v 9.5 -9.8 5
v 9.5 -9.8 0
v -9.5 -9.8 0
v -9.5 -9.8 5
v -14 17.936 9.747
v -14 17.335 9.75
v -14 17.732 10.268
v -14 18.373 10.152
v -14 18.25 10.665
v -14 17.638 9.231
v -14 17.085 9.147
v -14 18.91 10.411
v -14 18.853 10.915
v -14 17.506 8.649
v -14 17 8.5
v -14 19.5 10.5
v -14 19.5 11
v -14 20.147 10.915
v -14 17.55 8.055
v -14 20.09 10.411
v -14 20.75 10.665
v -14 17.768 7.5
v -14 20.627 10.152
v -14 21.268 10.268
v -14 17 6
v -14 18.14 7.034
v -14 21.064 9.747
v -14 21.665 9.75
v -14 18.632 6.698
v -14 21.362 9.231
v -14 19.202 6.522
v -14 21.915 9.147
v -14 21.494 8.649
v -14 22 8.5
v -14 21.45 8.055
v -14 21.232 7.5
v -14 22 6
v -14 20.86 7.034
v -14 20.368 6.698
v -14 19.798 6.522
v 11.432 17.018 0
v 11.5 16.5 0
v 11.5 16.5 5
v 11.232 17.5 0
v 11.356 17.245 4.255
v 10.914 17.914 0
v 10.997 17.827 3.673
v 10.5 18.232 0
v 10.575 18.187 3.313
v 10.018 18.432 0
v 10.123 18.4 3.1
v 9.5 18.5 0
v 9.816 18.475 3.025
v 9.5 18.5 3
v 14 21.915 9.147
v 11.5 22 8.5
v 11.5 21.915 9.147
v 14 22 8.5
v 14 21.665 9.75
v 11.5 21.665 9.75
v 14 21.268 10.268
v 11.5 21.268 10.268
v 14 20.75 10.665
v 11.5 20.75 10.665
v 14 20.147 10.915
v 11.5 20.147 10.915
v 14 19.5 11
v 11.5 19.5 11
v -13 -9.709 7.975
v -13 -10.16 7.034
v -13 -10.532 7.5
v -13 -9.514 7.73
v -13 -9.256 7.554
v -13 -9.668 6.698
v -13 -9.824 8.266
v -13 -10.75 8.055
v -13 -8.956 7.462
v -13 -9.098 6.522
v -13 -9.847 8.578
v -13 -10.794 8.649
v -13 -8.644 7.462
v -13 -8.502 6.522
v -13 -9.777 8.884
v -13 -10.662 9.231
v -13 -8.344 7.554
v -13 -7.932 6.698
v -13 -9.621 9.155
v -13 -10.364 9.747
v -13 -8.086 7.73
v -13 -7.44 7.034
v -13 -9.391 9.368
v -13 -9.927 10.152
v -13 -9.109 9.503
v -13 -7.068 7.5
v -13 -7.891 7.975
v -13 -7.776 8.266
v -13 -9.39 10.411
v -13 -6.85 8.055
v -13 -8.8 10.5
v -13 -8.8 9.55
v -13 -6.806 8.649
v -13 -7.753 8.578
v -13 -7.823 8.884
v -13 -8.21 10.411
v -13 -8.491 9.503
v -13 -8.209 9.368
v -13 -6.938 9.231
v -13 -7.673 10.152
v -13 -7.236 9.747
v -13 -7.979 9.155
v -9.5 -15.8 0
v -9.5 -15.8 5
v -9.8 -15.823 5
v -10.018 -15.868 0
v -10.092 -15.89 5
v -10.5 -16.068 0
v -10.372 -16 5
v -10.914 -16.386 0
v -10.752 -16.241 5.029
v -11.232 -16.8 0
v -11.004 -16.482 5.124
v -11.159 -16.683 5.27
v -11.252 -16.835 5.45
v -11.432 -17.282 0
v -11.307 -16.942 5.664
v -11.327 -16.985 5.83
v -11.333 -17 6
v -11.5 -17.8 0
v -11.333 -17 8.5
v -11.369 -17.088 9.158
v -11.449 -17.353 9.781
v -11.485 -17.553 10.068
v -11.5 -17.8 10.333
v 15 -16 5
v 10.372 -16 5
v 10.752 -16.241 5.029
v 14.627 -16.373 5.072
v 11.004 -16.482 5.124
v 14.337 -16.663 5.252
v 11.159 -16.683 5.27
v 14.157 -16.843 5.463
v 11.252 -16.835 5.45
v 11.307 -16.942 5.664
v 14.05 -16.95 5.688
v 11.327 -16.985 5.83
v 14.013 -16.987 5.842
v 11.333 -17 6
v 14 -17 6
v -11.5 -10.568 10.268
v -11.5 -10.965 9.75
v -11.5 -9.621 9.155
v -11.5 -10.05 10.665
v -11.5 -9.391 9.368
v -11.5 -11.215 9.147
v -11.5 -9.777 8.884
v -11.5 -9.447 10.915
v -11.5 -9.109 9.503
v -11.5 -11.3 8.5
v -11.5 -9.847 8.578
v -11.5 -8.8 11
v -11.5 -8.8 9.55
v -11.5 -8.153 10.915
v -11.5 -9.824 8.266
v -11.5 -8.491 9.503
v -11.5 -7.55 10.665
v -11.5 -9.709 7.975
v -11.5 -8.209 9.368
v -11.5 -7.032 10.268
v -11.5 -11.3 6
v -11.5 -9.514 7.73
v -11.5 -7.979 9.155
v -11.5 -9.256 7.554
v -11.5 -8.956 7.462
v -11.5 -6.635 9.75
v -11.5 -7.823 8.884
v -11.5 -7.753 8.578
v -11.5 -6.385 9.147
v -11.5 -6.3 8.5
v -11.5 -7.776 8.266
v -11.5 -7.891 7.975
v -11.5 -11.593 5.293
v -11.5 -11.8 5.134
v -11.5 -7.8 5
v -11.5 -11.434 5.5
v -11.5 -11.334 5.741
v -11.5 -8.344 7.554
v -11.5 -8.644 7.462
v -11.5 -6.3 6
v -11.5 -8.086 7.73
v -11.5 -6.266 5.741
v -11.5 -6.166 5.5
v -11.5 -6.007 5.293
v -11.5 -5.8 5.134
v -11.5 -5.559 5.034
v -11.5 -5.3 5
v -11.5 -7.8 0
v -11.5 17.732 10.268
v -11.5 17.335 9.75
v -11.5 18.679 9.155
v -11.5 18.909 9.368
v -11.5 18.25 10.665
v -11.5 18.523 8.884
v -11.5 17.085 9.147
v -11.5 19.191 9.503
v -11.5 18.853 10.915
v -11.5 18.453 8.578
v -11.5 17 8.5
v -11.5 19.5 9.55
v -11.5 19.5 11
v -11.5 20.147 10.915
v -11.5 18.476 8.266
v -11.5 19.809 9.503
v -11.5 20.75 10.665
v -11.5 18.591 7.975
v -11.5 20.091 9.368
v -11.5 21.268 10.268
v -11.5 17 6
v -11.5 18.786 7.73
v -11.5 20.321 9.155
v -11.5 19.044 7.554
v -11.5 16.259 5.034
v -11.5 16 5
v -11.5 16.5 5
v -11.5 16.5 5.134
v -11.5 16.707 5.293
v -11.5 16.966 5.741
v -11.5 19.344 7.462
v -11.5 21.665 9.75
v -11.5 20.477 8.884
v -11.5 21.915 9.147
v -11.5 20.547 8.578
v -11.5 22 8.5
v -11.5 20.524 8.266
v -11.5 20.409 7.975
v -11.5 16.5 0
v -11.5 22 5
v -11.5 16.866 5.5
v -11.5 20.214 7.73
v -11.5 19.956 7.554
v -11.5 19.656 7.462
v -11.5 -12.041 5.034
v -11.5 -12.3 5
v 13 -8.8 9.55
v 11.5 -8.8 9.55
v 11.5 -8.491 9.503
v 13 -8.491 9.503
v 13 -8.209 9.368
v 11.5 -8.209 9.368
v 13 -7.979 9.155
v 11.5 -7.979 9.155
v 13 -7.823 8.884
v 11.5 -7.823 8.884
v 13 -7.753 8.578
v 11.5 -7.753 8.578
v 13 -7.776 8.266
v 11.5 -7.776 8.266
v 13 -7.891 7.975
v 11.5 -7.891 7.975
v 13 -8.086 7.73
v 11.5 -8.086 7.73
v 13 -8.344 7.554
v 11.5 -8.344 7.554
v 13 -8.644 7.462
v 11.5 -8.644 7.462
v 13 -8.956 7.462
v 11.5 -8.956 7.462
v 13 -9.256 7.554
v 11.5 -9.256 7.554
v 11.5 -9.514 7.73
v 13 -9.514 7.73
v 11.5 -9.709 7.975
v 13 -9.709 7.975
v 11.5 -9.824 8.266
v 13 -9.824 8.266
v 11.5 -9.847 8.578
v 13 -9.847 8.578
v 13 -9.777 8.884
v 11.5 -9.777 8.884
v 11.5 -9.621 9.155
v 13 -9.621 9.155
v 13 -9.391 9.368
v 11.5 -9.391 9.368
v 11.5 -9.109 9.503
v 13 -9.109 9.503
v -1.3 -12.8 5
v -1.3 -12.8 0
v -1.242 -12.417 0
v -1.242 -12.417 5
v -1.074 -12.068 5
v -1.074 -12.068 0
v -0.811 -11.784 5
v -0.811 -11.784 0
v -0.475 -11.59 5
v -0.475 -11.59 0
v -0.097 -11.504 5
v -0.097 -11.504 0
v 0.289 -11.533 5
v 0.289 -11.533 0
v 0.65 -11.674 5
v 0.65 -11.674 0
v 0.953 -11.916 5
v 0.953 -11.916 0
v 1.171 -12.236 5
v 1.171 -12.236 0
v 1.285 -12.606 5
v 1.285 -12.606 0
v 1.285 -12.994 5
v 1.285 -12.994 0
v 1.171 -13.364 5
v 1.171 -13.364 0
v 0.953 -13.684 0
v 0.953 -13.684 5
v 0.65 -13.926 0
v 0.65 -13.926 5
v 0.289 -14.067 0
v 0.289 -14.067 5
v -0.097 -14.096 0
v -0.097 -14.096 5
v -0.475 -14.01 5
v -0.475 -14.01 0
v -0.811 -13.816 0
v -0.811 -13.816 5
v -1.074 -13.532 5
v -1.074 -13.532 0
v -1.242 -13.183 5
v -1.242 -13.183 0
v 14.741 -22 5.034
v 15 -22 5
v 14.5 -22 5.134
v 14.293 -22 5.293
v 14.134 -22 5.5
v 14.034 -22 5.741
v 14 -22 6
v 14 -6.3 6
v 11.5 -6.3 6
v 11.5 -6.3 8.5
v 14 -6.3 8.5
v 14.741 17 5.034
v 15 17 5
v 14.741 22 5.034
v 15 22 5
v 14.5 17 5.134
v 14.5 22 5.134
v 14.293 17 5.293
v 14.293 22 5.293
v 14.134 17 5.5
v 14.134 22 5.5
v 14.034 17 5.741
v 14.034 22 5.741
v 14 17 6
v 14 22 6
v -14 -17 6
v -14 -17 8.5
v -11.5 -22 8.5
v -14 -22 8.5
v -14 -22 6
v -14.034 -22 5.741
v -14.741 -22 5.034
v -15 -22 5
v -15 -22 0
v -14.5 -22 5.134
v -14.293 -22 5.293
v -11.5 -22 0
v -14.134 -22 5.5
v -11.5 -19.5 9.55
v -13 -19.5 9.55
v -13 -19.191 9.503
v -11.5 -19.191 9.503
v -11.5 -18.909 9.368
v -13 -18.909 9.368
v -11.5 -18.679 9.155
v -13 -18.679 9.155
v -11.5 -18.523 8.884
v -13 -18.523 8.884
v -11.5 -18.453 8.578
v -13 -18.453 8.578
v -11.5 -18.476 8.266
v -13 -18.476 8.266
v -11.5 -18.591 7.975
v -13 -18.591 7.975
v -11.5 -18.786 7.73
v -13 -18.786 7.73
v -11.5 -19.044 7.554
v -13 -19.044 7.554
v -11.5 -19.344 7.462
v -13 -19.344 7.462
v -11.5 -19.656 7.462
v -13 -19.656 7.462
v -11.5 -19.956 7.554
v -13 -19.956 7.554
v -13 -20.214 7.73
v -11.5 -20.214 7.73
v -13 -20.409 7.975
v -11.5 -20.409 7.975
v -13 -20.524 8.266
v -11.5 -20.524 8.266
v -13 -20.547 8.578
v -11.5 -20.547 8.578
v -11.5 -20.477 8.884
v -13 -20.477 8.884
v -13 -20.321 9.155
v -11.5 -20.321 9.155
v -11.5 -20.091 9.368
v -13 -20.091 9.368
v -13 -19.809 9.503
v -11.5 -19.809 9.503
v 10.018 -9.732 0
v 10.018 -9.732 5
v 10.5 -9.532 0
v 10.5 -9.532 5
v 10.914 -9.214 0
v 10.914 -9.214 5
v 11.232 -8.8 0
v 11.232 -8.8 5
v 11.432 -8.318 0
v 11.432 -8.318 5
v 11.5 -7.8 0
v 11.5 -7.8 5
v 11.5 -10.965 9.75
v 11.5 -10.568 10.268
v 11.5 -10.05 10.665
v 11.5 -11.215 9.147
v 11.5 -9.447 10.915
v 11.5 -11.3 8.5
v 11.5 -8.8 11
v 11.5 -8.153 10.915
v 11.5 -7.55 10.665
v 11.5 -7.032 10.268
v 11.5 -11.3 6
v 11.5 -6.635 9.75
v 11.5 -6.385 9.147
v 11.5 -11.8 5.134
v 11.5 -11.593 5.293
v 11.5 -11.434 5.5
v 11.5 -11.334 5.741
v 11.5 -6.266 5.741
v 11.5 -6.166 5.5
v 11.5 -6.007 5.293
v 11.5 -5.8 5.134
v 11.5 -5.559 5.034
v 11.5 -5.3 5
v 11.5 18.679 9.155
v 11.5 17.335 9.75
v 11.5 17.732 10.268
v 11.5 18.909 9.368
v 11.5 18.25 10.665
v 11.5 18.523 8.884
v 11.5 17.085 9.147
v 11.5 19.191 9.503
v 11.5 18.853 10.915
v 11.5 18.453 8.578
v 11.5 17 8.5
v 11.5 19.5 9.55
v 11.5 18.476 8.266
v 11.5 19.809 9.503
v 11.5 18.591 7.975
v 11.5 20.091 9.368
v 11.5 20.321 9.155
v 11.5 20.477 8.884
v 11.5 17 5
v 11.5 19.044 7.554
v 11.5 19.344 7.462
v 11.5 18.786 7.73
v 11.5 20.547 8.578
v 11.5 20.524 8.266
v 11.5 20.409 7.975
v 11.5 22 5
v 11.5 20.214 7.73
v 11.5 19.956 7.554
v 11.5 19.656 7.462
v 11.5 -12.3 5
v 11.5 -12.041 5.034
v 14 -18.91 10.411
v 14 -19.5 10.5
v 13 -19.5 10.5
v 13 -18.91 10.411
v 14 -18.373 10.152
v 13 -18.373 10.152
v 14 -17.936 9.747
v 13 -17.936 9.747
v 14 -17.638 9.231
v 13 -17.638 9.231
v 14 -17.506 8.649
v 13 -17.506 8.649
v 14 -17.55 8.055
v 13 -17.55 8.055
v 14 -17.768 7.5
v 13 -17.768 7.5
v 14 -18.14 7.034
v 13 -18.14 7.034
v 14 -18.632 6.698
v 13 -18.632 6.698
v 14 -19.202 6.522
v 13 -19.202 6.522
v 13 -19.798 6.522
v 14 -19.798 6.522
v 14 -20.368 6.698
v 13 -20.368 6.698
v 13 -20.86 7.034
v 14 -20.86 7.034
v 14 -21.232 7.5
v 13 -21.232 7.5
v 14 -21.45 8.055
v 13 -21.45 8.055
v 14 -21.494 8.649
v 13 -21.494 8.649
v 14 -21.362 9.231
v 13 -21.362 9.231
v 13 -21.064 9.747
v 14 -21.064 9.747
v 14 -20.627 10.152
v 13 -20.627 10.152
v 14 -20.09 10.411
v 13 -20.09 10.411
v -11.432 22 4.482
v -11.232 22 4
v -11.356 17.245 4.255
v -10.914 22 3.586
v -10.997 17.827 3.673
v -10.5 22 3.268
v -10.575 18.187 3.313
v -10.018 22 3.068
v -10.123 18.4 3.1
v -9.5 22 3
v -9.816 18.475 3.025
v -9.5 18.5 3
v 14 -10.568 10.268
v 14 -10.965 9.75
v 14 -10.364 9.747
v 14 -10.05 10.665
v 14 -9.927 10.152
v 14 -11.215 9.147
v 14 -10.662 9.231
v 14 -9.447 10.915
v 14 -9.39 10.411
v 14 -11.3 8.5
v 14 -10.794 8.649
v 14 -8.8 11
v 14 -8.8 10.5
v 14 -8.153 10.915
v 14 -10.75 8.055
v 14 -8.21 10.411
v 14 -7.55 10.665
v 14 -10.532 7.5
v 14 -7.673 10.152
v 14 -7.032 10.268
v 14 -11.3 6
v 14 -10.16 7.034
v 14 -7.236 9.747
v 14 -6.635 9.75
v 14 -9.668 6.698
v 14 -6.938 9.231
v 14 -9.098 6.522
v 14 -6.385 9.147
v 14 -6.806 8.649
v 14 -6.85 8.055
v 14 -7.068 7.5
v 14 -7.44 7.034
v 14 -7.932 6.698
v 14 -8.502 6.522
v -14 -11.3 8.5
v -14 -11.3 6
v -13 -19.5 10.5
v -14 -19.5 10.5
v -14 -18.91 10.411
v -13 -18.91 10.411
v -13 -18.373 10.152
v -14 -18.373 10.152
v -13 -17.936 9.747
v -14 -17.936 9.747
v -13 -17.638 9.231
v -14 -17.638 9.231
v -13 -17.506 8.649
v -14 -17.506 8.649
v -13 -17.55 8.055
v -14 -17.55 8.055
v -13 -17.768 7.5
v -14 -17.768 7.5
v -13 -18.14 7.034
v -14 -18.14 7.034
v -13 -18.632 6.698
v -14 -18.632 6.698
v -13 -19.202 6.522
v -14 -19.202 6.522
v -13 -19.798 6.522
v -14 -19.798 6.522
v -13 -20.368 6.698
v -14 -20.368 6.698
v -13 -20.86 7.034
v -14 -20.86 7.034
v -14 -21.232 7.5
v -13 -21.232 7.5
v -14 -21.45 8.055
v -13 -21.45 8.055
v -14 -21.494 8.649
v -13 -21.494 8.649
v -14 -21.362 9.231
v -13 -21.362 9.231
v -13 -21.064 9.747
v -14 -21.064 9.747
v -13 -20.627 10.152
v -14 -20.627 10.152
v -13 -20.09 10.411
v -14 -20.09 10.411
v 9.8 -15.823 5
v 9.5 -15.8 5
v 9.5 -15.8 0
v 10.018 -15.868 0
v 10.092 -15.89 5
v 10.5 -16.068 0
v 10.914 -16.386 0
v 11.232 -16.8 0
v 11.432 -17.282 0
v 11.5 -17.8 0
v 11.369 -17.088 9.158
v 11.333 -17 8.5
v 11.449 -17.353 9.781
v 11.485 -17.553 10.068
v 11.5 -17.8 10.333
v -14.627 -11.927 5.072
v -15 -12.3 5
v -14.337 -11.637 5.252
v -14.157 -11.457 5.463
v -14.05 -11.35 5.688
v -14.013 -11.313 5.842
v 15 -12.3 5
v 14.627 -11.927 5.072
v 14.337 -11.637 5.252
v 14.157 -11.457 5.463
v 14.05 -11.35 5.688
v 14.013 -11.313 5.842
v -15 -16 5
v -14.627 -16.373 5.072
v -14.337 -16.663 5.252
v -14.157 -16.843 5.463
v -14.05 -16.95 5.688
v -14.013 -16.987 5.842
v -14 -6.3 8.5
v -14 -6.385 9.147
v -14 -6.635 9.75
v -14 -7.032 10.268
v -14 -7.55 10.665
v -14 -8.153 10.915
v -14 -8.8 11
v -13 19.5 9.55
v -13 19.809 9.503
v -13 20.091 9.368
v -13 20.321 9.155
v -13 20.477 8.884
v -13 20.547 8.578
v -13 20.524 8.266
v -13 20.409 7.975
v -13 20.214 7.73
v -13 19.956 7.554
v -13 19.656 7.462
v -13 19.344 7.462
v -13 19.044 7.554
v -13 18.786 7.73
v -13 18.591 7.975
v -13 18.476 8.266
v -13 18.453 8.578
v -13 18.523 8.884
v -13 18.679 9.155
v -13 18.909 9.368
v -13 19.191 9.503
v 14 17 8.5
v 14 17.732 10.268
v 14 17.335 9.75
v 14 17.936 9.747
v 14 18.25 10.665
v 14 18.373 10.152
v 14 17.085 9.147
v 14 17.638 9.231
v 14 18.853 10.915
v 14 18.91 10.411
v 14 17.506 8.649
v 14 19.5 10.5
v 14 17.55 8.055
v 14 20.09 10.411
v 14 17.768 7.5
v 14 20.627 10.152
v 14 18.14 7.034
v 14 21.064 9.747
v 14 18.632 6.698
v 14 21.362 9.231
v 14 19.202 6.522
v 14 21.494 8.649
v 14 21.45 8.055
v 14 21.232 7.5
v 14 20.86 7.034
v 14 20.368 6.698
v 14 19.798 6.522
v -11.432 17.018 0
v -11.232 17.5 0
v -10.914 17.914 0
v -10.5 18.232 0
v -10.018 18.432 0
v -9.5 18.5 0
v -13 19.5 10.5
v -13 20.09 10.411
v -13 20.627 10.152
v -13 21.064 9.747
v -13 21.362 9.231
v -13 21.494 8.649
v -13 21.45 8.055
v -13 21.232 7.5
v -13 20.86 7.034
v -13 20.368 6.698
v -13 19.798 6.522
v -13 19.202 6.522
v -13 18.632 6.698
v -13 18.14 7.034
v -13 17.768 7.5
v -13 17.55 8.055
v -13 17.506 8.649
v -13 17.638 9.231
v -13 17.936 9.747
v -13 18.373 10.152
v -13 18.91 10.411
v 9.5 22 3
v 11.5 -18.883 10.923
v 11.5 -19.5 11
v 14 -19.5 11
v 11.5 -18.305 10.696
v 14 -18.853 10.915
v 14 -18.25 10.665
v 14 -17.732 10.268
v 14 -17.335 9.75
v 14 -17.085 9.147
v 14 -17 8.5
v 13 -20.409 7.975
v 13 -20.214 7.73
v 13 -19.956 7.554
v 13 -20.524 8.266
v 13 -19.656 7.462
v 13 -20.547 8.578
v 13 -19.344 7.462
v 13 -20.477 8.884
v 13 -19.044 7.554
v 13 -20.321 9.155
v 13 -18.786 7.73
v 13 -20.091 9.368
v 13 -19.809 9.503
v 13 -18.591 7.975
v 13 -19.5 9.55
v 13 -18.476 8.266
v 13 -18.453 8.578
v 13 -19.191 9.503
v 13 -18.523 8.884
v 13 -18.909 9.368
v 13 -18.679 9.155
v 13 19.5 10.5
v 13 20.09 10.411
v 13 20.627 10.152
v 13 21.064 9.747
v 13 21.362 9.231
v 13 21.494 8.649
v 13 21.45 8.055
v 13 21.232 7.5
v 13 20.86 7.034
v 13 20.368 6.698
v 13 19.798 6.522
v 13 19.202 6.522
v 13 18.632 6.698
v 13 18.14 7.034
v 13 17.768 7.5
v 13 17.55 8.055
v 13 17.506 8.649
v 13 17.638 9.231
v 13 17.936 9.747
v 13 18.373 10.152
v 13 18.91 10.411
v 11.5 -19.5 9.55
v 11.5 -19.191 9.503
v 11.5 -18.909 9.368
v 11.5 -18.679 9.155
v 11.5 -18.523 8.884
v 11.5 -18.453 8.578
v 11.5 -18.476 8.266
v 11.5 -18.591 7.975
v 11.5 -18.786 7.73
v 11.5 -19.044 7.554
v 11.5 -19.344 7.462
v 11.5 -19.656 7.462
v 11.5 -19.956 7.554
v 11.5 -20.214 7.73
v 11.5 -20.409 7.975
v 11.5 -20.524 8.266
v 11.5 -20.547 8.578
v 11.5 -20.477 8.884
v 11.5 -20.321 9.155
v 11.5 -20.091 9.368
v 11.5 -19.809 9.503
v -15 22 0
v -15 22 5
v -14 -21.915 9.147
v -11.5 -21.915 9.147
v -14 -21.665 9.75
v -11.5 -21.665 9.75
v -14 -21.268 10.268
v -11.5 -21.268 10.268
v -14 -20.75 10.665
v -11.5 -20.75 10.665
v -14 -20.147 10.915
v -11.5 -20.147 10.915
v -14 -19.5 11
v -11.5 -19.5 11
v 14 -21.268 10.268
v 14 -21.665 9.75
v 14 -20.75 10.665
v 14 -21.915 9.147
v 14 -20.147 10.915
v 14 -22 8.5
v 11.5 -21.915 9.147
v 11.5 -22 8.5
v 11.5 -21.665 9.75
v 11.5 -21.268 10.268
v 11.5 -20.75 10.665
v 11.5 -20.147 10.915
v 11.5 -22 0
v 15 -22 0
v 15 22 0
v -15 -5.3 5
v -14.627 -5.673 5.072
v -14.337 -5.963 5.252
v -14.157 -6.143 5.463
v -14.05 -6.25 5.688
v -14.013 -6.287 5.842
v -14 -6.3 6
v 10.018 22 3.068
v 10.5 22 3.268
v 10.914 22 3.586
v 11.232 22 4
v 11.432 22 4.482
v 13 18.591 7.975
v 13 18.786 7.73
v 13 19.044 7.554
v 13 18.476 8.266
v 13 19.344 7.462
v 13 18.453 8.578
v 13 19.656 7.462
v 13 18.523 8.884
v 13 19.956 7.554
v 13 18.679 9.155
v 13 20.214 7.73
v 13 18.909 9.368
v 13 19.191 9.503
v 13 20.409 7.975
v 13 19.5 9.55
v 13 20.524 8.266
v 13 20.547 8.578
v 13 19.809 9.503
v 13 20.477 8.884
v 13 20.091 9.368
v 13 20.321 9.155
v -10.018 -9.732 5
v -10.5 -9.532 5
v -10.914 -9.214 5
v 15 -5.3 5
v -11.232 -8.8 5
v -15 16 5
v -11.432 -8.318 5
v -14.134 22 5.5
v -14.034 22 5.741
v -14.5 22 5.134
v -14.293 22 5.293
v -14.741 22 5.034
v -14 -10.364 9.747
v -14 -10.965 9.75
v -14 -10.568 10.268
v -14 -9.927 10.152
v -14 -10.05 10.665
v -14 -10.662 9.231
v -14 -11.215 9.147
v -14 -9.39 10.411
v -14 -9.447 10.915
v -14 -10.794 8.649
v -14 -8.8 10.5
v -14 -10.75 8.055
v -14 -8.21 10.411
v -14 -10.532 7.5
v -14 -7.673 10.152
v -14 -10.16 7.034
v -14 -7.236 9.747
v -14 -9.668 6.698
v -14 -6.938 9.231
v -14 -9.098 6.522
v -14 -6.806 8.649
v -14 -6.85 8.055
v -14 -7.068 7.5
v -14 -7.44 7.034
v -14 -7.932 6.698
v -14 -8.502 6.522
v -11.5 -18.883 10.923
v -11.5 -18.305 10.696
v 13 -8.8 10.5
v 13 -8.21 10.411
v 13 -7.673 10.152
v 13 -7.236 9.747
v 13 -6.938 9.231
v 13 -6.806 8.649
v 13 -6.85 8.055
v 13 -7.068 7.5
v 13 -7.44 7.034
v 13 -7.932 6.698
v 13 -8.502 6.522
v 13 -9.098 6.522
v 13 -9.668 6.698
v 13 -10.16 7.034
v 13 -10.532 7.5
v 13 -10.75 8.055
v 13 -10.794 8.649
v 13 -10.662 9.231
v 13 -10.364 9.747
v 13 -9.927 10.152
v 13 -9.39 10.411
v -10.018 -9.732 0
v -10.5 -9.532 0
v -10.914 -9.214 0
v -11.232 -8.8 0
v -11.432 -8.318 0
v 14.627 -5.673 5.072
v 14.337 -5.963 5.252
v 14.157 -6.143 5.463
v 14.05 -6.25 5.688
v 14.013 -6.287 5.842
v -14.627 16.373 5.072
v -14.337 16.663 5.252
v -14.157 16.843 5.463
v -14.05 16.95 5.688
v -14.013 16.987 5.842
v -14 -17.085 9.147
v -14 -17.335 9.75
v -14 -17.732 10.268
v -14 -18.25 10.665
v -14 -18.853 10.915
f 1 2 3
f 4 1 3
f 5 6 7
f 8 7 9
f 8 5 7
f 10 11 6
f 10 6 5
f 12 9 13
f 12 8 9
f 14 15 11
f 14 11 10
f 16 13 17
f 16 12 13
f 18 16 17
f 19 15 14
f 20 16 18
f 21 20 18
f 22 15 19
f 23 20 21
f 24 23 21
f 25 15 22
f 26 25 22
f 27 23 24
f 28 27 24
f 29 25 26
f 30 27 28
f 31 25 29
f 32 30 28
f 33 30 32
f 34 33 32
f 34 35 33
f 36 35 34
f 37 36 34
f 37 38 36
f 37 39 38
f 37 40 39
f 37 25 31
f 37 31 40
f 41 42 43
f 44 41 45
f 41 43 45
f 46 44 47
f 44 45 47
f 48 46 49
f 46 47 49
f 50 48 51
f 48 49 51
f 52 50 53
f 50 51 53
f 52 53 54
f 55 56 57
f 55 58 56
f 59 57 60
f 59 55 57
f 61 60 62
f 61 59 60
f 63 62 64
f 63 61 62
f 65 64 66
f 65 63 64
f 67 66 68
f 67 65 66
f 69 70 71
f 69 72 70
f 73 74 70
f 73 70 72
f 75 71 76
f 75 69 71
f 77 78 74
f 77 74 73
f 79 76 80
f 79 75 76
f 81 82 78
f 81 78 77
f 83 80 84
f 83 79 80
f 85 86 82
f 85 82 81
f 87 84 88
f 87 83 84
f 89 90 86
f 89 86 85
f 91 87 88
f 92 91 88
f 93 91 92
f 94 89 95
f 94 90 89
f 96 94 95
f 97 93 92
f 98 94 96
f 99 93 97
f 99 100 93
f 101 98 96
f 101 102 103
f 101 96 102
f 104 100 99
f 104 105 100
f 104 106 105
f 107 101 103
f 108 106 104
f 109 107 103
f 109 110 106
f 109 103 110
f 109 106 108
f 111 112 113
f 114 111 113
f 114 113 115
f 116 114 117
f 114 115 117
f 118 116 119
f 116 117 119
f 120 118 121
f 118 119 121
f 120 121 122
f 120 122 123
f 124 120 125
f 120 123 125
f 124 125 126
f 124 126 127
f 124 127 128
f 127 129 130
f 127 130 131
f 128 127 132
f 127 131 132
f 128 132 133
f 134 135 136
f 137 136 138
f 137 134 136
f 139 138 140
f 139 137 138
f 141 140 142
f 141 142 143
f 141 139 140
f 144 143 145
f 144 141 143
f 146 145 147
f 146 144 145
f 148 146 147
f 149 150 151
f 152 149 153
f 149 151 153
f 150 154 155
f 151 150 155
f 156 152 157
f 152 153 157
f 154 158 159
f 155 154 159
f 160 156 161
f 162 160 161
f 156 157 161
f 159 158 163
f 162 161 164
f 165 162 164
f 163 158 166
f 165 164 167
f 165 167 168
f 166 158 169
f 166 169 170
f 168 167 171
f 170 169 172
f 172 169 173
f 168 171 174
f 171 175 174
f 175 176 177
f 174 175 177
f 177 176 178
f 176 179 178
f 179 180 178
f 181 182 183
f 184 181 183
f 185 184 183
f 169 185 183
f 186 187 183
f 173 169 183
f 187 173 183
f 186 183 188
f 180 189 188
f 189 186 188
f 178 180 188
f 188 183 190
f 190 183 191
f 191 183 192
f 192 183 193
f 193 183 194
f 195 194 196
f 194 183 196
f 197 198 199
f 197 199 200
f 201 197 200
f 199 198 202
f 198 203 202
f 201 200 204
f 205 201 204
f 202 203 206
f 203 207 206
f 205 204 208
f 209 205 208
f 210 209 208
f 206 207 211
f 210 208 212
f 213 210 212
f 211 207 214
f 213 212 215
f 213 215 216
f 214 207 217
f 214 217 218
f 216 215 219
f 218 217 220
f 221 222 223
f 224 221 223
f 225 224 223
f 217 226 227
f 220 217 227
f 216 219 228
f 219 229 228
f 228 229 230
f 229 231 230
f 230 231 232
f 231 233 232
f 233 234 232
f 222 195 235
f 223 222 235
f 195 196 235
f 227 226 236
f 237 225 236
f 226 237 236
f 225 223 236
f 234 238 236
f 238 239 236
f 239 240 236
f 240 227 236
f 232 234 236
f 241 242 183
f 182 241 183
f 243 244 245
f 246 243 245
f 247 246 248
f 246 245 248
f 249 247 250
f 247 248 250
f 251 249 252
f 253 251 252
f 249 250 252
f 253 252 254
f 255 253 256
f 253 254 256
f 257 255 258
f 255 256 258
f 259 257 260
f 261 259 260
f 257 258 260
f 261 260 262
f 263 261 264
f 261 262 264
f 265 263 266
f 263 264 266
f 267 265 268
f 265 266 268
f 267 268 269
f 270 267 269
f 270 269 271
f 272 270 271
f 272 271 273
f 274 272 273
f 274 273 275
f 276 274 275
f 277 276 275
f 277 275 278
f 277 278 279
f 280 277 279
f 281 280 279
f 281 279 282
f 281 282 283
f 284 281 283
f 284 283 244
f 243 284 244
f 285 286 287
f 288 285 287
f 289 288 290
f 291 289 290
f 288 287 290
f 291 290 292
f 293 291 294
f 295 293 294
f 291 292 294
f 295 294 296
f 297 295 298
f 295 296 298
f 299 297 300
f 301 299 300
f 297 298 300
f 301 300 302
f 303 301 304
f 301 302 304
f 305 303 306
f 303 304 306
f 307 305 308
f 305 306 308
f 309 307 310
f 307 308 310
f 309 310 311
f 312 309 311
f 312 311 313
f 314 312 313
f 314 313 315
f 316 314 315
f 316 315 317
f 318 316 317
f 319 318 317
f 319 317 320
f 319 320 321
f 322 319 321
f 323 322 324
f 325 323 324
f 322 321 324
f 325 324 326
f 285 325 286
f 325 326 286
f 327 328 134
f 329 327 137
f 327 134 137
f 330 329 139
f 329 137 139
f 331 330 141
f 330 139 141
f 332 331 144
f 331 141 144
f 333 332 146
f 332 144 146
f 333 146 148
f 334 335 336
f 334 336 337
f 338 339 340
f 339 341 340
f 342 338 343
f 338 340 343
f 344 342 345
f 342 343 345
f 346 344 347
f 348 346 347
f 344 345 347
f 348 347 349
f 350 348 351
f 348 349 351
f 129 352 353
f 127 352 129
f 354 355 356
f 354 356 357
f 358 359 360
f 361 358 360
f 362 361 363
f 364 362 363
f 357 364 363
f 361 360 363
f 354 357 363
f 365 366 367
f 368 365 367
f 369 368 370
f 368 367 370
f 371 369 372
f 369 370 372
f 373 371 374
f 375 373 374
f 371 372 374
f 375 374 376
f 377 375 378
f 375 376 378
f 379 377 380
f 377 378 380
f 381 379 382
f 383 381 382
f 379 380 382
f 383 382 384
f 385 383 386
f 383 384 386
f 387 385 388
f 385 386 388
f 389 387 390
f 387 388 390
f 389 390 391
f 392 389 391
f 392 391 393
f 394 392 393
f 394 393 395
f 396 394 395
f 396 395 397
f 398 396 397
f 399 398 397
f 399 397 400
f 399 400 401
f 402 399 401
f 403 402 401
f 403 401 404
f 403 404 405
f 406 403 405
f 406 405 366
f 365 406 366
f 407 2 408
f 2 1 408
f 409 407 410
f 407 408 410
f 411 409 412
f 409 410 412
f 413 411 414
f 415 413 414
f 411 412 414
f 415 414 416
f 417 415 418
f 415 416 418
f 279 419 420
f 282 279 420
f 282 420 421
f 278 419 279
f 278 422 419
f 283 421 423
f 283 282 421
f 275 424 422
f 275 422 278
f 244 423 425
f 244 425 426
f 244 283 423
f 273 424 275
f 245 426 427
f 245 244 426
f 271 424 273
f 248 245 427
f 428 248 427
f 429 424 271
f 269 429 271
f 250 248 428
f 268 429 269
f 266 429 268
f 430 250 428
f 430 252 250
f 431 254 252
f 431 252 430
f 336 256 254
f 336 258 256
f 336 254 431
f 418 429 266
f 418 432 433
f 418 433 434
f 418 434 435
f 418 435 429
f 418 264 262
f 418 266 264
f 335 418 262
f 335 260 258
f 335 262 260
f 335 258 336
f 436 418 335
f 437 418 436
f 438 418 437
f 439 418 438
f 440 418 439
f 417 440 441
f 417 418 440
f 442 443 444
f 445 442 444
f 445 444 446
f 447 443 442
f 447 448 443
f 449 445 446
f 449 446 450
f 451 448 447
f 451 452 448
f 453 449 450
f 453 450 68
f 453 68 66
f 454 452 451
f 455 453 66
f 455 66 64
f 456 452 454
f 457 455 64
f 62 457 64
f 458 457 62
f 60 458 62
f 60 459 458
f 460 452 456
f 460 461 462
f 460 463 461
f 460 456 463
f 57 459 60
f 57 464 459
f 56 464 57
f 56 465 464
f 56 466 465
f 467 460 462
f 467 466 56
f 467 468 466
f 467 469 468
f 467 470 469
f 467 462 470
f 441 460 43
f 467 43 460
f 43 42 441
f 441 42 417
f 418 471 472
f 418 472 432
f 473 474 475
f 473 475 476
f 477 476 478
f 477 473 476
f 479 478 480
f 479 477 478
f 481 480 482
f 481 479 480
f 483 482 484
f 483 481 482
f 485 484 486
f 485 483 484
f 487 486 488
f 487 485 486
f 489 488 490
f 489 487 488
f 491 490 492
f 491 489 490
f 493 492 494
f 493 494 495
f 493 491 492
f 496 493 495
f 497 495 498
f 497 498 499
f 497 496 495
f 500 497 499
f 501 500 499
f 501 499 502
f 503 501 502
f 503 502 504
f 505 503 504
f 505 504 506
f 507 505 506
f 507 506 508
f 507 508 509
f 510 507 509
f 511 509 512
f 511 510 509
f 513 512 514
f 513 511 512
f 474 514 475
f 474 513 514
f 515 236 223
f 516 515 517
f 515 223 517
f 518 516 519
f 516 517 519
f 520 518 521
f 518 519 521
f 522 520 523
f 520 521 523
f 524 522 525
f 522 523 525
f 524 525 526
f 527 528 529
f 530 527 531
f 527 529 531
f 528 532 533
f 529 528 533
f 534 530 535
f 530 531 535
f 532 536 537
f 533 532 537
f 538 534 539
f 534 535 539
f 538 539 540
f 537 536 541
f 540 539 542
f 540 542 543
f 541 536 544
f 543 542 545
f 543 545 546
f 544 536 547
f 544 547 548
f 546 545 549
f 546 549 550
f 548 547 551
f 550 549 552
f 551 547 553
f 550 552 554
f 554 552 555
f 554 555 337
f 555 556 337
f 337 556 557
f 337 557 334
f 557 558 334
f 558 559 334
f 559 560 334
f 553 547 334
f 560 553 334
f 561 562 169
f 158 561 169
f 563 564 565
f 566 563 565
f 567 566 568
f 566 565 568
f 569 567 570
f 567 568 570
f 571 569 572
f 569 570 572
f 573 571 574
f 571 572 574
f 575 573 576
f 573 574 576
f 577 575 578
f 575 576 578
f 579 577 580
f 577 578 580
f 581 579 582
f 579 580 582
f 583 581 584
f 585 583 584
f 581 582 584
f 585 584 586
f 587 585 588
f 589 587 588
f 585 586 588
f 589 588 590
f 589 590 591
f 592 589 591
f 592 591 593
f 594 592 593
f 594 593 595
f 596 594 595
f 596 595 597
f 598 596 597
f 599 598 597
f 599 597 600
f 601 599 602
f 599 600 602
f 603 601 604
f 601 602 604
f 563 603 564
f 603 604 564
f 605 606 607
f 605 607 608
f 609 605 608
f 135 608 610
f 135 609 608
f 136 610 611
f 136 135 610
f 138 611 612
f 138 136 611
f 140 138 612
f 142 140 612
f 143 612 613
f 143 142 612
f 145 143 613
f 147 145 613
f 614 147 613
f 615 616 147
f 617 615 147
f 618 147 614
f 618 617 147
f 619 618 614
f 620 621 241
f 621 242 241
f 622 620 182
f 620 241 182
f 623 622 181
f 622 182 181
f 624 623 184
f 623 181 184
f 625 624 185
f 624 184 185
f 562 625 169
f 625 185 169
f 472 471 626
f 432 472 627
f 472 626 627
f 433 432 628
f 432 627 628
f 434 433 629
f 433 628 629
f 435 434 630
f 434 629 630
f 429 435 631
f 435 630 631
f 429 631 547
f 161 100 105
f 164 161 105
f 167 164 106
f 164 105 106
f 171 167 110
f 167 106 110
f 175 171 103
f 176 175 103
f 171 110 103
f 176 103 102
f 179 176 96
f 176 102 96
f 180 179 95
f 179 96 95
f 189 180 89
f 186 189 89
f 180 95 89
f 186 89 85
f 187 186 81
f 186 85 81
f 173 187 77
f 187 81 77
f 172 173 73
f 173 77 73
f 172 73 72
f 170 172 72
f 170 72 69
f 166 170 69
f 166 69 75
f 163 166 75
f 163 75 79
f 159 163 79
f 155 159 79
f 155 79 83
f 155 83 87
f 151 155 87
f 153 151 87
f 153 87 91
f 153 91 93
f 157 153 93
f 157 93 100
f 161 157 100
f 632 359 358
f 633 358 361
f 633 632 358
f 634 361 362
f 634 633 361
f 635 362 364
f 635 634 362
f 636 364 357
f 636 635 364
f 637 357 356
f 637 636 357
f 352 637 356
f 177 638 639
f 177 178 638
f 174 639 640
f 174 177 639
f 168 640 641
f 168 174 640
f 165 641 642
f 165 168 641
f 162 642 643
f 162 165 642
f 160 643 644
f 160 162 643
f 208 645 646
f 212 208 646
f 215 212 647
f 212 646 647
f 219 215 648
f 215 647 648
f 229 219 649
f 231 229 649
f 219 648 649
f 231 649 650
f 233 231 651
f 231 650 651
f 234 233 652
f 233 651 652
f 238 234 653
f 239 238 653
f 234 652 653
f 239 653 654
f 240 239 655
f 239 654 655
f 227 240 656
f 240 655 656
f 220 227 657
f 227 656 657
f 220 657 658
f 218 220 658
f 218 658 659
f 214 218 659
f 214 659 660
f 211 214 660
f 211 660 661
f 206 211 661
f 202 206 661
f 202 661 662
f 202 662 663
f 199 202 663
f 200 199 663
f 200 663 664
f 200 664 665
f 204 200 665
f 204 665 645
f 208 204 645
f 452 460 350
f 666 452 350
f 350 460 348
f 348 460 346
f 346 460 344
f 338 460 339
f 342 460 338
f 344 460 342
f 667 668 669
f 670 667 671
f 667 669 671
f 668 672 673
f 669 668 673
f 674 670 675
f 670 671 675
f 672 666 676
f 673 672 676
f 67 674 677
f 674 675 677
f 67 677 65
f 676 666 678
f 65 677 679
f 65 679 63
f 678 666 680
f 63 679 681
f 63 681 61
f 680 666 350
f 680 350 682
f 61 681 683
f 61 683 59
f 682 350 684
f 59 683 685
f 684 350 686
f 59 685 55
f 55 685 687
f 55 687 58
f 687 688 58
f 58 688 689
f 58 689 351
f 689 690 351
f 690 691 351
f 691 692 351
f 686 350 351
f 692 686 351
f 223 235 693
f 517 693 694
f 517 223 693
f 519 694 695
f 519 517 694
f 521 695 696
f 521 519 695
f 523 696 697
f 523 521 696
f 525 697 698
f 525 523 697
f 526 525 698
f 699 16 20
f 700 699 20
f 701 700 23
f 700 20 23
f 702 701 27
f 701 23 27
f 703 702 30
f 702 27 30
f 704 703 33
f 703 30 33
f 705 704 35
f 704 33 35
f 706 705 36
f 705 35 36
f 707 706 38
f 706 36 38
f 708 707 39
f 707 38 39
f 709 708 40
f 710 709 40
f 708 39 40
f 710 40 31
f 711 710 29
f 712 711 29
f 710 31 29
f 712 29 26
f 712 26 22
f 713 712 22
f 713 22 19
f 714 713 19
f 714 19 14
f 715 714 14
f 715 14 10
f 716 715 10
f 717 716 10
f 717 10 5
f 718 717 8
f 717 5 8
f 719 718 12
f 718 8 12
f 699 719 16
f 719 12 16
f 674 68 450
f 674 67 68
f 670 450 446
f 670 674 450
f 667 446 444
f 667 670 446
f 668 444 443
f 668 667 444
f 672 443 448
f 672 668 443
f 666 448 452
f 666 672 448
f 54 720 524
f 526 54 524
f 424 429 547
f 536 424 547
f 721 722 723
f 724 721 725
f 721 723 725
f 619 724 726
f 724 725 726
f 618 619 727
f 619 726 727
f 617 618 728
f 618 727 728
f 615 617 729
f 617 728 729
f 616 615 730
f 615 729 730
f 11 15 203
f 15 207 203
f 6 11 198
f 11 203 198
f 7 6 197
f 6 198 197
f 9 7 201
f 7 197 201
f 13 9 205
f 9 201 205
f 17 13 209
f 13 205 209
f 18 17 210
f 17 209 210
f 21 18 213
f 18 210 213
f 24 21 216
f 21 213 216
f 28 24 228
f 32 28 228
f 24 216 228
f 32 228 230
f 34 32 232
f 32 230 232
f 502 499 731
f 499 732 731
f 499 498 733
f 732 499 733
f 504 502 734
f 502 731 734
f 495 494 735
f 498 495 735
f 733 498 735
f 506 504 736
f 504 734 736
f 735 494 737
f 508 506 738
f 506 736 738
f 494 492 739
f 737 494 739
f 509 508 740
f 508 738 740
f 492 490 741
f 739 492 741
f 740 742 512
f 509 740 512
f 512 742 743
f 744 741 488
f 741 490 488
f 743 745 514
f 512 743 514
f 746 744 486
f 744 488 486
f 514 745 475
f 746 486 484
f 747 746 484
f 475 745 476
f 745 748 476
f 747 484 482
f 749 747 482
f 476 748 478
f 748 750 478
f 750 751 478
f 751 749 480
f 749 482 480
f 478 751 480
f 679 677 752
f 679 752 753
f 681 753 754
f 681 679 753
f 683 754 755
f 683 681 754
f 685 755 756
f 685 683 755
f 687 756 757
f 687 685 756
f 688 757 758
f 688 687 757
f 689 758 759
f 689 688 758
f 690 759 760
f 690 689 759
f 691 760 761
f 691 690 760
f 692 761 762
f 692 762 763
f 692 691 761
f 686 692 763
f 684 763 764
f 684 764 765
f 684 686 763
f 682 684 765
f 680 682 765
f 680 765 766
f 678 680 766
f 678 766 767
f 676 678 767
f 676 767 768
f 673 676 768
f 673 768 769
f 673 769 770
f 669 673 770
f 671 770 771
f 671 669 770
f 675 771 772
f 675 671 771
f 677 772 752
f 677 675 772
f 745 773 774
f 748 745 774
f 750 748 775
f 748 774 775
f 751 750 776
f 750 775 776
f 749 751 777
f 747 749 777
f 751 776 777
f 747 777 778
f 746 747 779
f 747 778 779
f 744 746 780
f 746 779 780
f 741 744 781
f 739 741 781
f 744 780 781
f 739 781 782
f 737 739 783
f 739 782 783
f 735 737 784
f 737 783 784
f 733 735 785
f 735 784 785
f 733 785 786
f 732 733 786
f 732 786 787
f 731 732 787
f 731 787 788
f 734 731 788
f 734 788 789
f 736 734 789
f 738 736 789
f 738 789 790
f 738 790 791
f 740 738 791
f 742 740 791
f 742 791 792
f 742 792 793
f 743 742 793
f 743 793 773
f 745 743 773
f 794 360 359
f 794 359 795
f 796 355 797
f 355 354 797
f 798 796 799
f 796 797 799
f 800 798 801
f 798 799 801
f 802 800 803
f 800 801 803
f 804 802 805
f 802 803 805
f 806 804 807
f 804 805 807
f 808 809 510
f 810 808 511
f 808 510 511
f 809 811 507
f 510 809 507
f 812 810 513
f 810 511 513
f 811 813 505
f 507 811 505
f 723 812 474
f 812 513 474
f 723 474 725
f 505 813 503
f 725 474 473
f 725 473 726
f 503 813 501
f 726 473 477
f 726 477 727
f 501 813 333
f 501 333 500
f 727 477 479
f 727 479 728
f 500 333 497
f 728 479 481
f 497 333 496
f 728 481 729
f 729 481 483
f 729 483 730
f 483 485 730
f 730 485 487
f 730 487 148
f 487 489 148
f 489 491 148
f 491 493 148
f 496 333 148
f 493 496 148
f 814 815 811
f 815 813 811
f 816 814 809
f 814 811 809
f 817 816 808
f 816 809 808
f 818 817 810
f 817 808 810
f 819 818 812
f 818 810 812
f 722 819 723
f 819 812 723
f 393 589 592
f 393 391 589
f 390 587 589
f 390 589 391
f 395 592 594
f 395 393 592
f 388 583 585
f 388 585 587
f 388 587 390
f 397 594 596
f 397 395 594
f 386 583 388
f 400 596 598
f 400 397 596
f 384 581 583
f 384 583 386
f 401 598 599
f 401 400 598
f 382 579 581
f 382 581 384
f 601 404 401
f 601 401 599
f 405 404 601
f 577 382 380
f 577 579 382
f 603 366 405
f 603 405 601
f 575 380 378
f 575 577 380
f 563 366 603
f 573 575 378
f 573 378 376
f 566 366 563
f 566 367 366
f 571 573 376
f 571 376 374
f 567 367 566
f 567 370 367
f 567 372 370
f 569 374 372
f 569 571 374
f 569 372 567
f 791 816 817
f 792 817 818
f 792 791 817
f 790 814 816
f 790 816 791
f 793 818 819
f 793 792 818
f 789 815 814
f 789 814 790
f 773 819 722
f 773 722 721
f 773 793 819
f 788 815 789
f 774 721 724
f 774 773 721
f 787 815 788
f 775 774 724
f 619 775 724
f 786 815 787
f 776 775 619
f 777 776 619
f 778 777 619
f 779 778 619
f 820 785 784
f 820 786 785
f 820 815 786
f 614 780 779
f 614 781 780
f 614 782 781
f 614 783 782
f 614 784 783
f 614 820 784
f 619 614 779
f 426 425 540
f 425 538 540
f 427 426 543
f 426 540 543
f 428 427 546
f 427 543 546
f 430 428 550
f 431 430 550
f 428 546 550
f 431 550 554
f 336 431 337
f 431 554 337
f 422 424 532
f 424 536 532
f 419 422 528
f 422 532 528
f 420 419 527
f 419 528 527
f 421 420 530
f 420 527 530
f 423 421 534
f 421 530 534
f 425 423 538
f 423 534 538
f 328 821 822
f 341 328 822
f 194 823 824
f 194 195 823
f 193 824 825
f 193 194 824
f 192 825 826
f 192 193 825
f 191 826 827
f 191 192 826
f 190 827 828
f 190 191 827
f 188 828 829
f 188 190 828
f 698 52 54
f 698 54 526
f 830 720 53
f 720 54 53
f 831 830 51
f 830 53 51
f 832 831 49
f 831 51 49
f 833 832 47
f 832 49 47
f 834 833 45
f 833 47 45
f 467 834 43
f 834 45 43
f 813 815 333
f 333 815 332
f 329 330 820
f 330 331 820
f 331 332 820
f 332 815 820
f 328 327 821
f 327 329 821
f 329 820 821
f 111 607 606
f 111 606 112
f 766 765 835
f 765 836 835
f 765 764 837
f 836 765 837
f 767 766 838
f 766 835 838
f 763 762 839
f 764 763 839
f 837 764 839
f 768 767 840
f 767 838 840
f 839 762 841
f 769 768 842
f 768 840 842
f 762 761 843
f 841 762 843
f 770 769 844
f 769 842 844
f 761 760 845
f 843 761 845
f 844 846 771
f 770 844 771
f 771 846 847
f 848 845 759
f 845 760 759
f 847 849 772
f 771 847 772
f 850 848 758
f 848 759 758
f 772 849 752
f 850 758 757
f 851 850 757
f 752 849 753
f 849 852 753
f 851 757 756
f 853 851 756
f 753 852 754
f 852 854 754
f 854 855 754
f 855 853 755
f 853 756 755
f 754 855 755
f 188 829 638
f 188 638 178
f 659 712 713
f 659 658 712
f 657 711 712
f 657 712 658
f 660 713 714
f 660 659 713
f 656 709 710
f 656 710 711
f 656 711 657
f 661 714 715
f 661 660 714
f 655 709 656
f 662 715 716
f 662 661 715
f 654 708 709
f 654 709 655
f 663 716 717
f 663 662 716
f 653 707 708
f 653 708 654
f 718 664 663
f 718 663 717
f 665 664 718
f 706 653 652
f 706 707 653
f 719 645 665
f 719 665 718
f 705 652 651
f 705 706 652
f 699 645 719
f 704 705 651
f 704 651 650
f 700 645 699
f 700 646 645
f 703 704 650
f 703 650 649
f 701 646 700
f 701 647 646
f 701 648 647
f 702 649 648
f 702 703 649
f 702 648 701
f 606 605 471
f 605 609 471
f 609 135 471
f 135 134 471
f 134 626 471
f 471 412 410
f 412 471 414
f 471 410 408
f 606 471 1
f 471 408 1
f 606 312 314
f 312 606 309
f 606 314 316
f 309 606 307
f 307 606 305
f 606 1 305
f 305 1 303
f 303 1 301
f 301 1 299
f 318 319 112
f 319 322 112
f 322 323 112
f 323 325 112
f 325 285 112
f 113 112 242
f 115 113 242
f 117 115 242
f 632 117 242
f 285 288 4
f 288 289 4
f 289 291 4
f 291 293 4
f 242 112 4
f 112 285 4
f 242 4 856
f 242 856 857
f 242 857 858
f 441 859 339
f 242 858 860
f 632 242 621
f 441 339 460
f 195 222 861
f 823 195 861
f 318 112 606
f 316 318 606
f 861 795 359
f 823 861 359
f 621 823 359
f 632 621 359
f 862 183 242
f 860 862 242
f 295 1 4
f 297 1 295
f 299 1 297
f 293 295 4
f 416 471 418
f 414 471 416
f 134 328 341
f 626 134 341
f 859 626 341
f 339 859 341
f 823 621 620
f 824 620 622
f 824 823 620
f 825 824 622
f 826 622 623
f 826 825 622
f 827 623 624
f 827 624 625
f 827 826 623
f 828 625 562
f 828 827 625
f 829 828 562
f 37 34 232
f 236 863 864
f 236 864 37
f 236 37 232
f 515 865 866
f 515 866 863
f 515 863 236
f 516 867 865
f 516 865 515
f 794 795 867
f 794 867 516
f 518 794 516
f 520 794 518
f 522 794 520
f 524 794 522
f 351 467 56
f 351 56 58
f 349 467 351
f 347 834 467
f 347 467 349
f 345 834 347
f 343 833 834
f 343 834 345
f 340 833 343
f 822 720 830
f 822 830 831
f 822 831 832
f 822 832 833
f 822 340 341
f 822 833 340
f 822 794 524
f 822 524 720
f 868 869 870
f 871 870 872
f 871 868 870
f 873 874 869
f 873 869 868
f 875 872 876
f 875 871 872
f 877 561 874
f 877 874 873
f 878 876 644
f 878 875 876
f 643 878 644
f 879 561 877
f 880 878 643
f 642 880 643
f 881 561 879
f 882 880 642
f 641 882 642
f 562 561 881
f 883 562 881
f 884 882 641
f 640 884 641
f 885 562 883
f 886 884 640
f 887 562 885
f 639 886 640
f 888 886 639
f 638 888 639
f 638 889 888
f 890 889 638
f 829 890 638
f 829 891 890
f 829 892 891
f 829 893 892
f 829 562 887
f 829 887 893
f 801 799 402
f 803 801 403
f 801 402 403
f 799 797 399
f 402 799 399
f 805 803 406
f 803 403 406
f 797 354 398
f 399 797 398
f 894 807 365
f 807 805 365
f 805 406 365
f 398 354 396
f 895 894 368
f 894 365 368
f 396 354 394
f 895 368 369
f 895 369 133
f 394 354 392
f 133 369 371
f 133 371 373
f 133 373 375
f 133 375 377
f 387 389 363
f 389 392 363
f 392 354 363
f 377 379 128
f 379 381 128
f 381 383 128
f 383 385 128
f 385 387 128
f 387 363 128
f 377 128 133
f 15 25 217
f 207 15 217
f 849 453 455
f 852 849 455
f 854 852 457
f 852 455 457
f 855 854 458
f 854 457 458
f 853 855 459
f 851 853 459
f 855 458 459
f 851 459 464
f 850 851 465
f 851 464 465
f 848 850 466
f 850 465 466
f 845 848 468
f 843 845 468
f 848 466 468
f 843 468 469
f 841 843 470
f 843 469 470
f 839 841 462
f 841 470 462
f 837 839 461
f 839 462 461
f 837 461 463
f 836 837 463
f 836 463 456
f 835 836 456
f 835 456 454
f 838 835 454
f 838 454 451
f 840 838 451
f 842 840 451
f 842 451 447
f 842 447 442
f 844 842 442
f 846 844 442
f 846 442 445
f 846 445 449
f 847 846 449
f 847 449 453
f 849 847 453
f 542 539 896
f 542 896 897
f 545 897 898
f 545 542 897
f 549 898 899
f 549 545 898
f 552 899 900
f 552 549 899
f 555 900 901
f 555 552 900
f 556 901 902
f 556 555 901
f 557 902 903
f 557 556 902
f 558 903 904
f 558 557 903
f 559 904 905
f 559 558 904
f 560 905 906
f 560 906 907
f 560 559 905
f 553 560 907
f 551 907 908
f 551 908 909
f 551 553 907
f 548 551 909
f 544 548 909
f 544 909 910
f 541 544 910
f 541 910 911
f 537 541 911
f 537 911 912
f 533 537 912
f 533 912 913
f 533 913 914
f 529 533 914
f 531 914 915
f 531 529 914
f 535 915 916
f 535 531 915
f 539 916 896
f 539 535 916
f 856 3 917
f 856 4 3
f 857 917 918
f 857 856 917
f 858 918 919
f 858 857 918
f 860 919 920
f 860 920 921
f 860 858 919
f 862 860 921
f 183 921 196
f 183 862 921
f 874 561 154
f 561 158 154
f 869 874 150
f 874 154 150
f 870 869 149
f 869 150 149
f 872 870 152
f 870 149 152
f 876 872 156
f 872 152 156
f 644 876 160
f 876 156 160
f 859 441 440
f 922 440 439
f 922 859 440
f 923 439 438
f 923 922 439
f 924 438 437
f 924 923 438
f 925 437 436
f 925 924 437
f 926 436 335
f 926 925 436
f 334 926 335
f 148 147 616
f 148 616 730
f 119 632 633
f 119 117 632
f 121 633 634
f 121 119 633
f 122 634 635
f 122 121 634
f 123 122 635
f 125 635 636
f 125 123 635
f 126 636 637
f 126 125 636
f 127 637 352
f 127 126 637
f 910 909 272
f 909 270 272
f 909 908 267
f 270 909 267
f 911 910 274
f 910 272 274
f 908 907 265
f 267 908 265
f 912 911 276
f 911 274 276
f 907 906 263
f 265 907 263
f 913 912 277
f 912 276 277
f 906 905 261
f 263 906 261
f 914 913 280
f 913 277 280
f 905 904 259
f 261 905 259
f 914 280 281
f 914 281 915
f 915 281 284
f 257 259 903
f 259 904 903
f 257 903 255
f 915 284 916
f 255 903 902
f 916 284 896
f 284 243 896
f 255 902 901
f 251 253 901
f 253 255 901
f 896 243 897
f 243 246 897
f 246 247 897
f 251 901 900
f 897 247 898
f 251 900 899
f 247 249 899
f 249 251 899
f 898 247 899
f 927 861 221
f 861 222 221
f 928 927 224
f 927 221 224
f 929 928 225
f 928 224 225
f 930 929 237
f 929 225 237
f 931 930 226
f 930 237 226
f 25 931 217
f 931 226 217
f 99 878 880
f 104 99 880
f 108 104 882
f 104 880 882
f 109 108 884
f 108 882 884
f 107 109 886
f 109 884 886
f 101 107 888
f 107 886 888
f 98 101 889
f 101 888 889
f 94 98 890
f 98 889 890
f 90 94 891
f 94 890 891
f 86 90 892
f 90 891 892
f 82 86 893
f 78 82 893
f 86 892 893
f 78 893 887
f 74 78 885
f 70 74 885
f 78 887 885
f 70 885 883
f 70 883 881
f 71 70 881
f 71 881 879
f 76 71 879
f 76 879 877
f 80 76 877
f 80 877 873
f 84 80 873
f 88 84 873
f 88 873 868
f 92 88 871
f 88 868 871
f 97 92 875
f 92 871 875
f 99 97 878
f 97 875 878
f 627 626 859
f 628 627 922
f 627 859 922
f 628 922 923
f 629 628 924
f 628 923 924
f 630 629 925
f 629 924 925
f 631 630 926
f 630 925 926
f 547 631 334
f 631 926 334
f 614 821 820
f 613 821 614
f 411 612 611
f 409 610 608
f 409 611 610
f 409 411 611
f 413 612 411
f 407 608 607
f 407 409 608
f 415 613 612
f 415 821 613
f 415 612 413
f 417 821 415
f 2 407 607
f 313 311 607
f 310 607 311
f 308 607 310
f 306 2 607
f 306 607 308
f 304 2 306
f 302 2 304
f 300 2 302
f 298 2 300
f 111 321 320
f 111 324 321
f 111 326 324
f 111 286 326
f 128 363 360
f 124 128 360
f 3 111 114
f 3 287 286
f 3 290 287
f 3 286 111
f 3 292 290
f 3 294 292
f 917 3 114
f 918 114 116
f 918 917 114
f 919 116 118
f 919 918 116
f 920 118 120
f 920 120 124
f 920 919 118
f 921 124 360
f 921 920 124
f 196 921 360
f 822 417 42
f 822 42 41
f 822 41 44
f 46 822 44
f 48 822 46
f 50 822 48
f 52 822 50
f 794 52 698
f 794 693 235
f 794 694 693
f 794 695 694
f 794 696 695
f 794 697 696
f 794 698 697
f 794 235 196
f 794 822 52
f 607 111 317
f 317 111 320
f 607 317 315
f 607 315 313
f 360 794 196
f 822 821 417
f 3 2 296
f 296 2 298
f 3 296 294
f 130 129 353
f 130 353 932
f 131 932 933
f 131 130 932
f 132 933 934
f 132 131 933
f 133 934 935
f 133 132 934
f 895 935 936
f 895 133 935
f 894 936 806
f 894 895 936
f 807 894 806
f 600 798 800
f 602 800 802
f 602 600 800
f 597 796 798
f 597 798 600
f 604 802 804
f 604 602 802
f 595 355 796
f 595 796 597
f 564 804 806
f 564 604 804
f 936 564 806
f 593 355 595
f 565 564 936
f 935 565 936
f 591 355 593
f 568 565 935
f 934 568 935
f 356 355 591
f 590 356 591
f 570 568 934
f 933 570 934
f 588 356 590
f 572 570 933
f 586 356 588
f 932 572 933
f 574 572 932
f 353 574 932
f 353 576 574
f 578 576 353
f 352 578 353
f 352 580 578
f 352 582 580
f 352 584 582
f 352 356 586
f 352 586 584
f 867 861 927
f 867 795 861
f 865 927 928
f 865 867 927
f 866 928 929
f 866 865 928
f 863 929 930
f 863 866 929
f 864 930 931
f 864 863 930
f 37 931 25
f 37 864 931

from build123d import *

# Parameters (mm, degrees)
SKETCH2_W             = 3.5
SKETCH2_H             = 44
BOSS_EXTRUDE1_DEPTH   = 5
BOSS_EXTRUDE1_2_DEPTH = 5
SKETCH3_W             = 30
SKETCH3_H             = 3.5
BOSS_EXTRUDE2_DEPTH   = 3
SKETCH4_W             = 2.5
SKETCH4_H             = 5
BOSS_EXTRUDE3_DEPTH   = 6
SKETCH5_R             = 1.05
CUT_EXTRUDE1_DEPTH    = 39.026306684
FILLET1_R             = 2.5
FILLET2_R             = 2
SKETCH6_W             = 23
SKETCH6_H             = 6
SKETCH6_R             = 1.3
BOSS_EXTRUDE4_DEPTH   = 5
FILLET3_R             = 2
SKETCH7_R             = 2
CUT_EXTRUDE2_DEPTH    = 1
FILLET4_R             = 1


with BuildPart() as part:
    # Sketch2 → Boss-Extrude1 (new body)
    with BuildSketch(Plane.XY):
        with Locations((-13.25, 0)):
            Rectangle(SKETCH2_W, SKETCH2_H)
    extrude(amount=BOSS_EXTRUDE1_DEPTH)



with BuildPart() as body_2:
    # Sketch2 → Boss-Extrude1 2 (new body)
    with BuildSketch(Plane.XY):
        with Locations((13.25, 0)):
            Rectangle(SKETCH2_W, SKETCH2_H)
    extrude(amount=BOSS_EXTRUDE1_2_DEPTH)


with BuildPart() as part_1:
    add(part.part)

    add(body_2.part)  # Boss-Extrude2 merges body 2
    # Sketch3 → Boss-Extrude2 (add)
    with BuildSketch(Plane(origin=(0, 0, 0), x_dir=(-1, 0, 0), z_dir=(0, 0, -1))):
        with Locations((0, 20.25)):
            Rectangle(SKETCH3_W, SKETCH3_H)
    extrude(amount=-BOSS_EXTRUDE2_DEPTH)

    # Sketch4 → Boss-Extrude3 (add)
    with BuildSketch(Plane.XY.offset(5)):
        with Locations((-12.75, 19.5)):
            Rectangle(SKETCH4_W, SKETCH4_H)
        with Locations((-12.75, -8.8)):
            Rectangle(SKETCH4_W, SKETCH4_H)
        with Locations((-12.75, -19.5)):
            Rectangle(SKETCH4_W, SKETCH4_H)
        with Locations((12.75, -19.5)):
            Rectangle(SKETCH4_W, SKETCH4_H)
        with Locations((12.75, -8.8)):
            Rectangle(SKETCH4_W, SKETCH4_H)
        with Locations((12.75, 19.5)):
            Rectangle(SKETCH4_W, SKETCH4_H)
    extrude(amount=BOSS_EXTRUDE3_DEPTH)

    # Sketch5 → Cut-Extrude1 (cut, through all)
    with BuildSketch(Plane.ZY.offset(14)):
        with Locations((8.5, 19.5)):
            Circle(SKETCH5_R)
        with Locations((8.5, -8.8)):
            Circle(SKETCH5_R)
        with Locations((8.5, -19.5)):
            Circle(SKETCH5_R)
    extrude(amount=-CUT_EXTRUDE1_DEPTH, mode=Mode.SUBTRACT)

    # Fillet1
    fillet1_edges = [part_1.edges().sort_by_distance(p)[0] for p in [
        (12.75, -17, 11),
        (12.75, -22, 11),
        (12.75, -6.3, 11),
        (12.75, -11.3, 11),
        (-12.75, -22, 11),
        (-12.75, -17, 11),
        (-12.75, -11.3, 11),
        (-12.75, -6.3, 11),
        (-12.75, 17, 11),
        (-12.75, 22, 11),
        (12.75, 22, 11),
        (12.75, 17, 11),
    ]]
    fillet(fillet1_edges, radius=FILLET1_R - 0.0001)  # a hair under: the kernel refuses the full size

    # Fillet2
    fillet2_edges = [part_1.edges().sort_by_distance(p)[0] for p in [
        (-11.5, 20.25, 3),
        (-11.5, 18.5, 1.5),
        (11.5, 18.5, 1.5),
        (11.5, 20.25, 3),
    ]]
    fillet(fillet2_edges, radius=FILLET2_R - 0.0001)  # a hair under: the kernel refuses the full size

    # Sketch6 → Boss-Extrude4 (add)
    with BuildSketch(Plane(origin=(0, 0, 0), x_dir=(-1, 0, 0), z_dir=(0, 0, -1))):
        with Locations((0, -12.8)):
            Rectangle(SKETCH6_W, SKETCH6_H)
        with Locations((0, -12.8)):
            Circle(SKETCH6_R, mode=Mode.SUBTRACT)
    extrude(amount=-BOSS_EXTRUDE4_DEPTH)

    # Fillet3
    fillet3_edges = [part_1.edges().sort_by_distance(p)[0] for p in [
        (-11.5, -9.8, 2.5),
        (-11.5, -15.8, 2.5),
        (11.5, -15.8, 2.5),
        (11.5, -9.8, 2.5),
    ]]
    fillet(fillet3_edges, radius=FILLET3_R)

    # Sketch7 → Cut-Extrude2 (cut)
    with BuildSketch(Plane.ZY.offset(14)):
        with Locations((8.5, 19.5)):
            Circle(SKETCH7_R)
        with Locations((8.5, -8.8)):
            Circle(SKETCH7_R)
        with Locations((8.5, -19.5)):
            Circle(SKETCH7_R)
    cut_extrude2 = extrude(amount=-CUT_EXTRUDE2_DEPTH, mode=Mode.SUBTRACT)

    # Mirror1: Cut-Extrude2 across plane
    add(cut_extrude2.mirror(Plane(origin=(0, 0, 0), x_dir=(0, 0, 1), z_dir=(1, 0, 0))), mode=Mode.SUBTRACT)

    # Fillet4
    fillet4_edges = [part_1.edges().sort_by_distance(p)[0] for p in [
        (12.75, -11.3, 5),
        (-12.75, -11.3, 5),
        (-12.75, 17, 5),
        (14, -19.5, 5),
        (14, -8.8, 5),
        (14, 19.5, 5),
        (-12.75, -6.3, 5),
        (-12.666515139, -17, 5),
        (-14, -19.5, 5),
        (-14, -8.8, 5),
        (12.666515139, -17, 5),
        (12.75, -6.3, 5),
        (-14, 19.5, 5),
    ]]
    fillet(fillet4_edges, radius=FILLET4_R - 0.0001)  # a hair under: the kernel refuses the full size


solid = part_1.part
